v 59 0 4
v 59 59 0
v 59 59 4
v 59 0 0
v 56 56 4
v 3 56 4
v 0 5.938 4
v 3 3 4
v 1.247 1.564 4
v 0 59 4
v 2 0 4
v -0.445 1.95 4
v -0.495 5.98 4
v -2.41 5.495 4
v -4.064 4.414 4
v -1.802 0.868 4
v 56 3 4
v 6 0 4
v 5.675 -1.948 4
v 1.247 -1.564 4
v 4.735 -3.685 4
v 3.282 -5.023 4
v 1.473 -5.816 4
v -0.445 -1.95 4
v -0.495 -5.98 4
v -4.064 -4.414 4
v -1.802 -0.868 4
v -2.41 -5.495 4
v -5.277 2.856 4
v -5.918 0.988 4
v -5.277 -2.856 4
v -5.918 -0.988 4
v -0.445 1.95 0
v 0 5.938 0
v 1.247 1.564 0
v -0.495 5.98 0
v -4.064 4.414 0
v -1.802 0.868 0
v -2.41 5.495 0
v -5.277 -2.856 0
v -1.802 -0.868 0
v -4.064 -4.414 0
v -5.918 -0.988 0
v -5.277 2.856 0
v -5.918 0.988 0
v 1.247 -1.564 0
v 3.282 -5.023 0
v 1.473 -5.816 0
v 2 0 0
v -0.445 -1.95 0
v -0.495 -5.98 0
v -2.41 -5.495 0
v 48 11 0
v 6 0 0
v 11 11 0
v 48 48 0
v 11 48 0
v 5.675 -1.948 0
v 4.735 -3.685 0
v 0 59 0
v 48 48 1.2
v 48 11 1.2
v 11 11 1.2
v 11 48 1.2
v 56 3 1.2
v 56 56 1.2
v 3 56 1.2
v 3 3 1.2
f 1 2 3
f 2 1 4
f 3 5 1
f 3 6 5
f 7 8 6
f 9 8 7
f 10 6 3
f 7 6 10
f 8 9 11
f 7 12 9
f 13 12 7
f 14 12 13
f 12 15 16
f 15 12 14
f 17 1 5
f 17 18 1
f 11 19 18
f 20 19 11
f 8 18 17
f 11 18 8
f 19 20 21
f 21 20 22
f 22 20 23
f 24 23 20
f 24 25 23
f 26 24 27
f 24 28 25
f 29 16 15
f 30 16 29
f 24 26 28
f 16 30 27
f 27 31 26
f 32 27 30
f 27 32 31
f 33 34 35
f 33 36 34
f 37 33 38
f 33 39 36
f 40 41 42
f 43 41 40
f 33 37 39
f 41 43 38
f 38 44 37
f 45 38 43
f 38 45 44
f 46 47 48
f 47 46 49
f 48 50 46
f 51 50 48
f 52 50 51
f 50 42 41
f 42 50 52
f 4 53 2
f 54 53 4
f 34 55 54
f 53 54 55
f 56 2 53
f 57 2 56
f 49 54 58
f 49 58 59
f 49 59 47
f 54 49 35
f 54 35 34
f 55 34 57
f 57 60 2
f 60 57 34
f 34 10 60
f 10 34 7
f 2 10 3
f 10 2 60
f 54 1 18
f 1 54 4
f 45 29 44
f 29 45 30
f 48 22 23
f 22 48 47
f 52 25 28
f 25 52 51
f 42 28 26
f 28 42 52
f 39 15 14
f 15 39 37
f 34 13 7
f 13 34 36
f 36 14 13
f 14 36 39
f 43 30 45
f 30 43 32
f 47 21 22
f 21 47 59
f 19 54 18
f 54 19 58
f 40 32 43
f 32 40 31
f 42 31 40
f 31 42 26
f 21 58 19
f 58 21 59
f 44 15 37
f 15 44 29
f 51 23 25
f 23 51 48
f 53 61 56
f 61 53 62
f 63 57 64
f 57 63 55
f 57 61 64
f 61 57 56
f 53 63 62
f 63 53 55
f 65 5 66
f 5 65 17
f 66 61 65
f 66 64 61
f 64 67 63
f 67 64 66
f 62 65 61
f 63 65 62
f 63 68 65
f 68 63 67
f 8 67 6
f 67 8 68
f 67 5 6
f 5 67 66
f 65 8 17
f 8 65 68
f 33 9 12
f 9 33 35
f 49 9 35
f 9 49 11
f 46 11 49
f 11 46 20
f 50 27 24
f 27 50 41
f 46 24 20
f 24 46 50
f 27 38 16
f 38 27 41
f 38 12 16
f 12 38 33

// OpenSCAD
// Solar bracket

// Inputs

actual_panel_size = 50;
tolerance = 3;
panel_size = actual_panel_size + tolerance;
panel_height = 2.8;

panel_bevel = 1.8;
panel_edge = 2;
display_panel = false;

external_margin = 3;
internal_margin = 8;
total_height = 4;
total_size = panel_size + (external_margin * 2);
    
hole_diameter = 4;
hole_margin = 8;

// Method
module bracket() {
    difference() {
        union() {
            difference() {
                union() {
                    cube([total_size, total_size, total_height], false);
                    cylinder(d=hole_diameter+hole_margin, h=total_height, center=false);
                }
                union() {       
                    origin = external_margin + internal_margin;
                    translate([origin, origin, -0.5]) { 
                        size = panel_size - (internal_margin * 2);
                        cube([size, size, total_height+1], false); 
                    }
                    
                    translate([external_margin, external_margin, total_height - panel_height]) { 
                        cube([panel_size, panel_size, panel_height+1], false); 
                    }
                }
            }  
            
        }
        translate([0,0,-0.5]) {
            cylinder(d=hole_diameter, h=total_height+1, center=false);
        }
    }
}



module panel() {
    translate([external_margin,external_margin,total_height - panel_height]) { cube([panel_size, panel_size, panel_height-0.01], false); }
}


if (display_panel) color("gray") { panel(); }
color("orange") { bracket(); };
